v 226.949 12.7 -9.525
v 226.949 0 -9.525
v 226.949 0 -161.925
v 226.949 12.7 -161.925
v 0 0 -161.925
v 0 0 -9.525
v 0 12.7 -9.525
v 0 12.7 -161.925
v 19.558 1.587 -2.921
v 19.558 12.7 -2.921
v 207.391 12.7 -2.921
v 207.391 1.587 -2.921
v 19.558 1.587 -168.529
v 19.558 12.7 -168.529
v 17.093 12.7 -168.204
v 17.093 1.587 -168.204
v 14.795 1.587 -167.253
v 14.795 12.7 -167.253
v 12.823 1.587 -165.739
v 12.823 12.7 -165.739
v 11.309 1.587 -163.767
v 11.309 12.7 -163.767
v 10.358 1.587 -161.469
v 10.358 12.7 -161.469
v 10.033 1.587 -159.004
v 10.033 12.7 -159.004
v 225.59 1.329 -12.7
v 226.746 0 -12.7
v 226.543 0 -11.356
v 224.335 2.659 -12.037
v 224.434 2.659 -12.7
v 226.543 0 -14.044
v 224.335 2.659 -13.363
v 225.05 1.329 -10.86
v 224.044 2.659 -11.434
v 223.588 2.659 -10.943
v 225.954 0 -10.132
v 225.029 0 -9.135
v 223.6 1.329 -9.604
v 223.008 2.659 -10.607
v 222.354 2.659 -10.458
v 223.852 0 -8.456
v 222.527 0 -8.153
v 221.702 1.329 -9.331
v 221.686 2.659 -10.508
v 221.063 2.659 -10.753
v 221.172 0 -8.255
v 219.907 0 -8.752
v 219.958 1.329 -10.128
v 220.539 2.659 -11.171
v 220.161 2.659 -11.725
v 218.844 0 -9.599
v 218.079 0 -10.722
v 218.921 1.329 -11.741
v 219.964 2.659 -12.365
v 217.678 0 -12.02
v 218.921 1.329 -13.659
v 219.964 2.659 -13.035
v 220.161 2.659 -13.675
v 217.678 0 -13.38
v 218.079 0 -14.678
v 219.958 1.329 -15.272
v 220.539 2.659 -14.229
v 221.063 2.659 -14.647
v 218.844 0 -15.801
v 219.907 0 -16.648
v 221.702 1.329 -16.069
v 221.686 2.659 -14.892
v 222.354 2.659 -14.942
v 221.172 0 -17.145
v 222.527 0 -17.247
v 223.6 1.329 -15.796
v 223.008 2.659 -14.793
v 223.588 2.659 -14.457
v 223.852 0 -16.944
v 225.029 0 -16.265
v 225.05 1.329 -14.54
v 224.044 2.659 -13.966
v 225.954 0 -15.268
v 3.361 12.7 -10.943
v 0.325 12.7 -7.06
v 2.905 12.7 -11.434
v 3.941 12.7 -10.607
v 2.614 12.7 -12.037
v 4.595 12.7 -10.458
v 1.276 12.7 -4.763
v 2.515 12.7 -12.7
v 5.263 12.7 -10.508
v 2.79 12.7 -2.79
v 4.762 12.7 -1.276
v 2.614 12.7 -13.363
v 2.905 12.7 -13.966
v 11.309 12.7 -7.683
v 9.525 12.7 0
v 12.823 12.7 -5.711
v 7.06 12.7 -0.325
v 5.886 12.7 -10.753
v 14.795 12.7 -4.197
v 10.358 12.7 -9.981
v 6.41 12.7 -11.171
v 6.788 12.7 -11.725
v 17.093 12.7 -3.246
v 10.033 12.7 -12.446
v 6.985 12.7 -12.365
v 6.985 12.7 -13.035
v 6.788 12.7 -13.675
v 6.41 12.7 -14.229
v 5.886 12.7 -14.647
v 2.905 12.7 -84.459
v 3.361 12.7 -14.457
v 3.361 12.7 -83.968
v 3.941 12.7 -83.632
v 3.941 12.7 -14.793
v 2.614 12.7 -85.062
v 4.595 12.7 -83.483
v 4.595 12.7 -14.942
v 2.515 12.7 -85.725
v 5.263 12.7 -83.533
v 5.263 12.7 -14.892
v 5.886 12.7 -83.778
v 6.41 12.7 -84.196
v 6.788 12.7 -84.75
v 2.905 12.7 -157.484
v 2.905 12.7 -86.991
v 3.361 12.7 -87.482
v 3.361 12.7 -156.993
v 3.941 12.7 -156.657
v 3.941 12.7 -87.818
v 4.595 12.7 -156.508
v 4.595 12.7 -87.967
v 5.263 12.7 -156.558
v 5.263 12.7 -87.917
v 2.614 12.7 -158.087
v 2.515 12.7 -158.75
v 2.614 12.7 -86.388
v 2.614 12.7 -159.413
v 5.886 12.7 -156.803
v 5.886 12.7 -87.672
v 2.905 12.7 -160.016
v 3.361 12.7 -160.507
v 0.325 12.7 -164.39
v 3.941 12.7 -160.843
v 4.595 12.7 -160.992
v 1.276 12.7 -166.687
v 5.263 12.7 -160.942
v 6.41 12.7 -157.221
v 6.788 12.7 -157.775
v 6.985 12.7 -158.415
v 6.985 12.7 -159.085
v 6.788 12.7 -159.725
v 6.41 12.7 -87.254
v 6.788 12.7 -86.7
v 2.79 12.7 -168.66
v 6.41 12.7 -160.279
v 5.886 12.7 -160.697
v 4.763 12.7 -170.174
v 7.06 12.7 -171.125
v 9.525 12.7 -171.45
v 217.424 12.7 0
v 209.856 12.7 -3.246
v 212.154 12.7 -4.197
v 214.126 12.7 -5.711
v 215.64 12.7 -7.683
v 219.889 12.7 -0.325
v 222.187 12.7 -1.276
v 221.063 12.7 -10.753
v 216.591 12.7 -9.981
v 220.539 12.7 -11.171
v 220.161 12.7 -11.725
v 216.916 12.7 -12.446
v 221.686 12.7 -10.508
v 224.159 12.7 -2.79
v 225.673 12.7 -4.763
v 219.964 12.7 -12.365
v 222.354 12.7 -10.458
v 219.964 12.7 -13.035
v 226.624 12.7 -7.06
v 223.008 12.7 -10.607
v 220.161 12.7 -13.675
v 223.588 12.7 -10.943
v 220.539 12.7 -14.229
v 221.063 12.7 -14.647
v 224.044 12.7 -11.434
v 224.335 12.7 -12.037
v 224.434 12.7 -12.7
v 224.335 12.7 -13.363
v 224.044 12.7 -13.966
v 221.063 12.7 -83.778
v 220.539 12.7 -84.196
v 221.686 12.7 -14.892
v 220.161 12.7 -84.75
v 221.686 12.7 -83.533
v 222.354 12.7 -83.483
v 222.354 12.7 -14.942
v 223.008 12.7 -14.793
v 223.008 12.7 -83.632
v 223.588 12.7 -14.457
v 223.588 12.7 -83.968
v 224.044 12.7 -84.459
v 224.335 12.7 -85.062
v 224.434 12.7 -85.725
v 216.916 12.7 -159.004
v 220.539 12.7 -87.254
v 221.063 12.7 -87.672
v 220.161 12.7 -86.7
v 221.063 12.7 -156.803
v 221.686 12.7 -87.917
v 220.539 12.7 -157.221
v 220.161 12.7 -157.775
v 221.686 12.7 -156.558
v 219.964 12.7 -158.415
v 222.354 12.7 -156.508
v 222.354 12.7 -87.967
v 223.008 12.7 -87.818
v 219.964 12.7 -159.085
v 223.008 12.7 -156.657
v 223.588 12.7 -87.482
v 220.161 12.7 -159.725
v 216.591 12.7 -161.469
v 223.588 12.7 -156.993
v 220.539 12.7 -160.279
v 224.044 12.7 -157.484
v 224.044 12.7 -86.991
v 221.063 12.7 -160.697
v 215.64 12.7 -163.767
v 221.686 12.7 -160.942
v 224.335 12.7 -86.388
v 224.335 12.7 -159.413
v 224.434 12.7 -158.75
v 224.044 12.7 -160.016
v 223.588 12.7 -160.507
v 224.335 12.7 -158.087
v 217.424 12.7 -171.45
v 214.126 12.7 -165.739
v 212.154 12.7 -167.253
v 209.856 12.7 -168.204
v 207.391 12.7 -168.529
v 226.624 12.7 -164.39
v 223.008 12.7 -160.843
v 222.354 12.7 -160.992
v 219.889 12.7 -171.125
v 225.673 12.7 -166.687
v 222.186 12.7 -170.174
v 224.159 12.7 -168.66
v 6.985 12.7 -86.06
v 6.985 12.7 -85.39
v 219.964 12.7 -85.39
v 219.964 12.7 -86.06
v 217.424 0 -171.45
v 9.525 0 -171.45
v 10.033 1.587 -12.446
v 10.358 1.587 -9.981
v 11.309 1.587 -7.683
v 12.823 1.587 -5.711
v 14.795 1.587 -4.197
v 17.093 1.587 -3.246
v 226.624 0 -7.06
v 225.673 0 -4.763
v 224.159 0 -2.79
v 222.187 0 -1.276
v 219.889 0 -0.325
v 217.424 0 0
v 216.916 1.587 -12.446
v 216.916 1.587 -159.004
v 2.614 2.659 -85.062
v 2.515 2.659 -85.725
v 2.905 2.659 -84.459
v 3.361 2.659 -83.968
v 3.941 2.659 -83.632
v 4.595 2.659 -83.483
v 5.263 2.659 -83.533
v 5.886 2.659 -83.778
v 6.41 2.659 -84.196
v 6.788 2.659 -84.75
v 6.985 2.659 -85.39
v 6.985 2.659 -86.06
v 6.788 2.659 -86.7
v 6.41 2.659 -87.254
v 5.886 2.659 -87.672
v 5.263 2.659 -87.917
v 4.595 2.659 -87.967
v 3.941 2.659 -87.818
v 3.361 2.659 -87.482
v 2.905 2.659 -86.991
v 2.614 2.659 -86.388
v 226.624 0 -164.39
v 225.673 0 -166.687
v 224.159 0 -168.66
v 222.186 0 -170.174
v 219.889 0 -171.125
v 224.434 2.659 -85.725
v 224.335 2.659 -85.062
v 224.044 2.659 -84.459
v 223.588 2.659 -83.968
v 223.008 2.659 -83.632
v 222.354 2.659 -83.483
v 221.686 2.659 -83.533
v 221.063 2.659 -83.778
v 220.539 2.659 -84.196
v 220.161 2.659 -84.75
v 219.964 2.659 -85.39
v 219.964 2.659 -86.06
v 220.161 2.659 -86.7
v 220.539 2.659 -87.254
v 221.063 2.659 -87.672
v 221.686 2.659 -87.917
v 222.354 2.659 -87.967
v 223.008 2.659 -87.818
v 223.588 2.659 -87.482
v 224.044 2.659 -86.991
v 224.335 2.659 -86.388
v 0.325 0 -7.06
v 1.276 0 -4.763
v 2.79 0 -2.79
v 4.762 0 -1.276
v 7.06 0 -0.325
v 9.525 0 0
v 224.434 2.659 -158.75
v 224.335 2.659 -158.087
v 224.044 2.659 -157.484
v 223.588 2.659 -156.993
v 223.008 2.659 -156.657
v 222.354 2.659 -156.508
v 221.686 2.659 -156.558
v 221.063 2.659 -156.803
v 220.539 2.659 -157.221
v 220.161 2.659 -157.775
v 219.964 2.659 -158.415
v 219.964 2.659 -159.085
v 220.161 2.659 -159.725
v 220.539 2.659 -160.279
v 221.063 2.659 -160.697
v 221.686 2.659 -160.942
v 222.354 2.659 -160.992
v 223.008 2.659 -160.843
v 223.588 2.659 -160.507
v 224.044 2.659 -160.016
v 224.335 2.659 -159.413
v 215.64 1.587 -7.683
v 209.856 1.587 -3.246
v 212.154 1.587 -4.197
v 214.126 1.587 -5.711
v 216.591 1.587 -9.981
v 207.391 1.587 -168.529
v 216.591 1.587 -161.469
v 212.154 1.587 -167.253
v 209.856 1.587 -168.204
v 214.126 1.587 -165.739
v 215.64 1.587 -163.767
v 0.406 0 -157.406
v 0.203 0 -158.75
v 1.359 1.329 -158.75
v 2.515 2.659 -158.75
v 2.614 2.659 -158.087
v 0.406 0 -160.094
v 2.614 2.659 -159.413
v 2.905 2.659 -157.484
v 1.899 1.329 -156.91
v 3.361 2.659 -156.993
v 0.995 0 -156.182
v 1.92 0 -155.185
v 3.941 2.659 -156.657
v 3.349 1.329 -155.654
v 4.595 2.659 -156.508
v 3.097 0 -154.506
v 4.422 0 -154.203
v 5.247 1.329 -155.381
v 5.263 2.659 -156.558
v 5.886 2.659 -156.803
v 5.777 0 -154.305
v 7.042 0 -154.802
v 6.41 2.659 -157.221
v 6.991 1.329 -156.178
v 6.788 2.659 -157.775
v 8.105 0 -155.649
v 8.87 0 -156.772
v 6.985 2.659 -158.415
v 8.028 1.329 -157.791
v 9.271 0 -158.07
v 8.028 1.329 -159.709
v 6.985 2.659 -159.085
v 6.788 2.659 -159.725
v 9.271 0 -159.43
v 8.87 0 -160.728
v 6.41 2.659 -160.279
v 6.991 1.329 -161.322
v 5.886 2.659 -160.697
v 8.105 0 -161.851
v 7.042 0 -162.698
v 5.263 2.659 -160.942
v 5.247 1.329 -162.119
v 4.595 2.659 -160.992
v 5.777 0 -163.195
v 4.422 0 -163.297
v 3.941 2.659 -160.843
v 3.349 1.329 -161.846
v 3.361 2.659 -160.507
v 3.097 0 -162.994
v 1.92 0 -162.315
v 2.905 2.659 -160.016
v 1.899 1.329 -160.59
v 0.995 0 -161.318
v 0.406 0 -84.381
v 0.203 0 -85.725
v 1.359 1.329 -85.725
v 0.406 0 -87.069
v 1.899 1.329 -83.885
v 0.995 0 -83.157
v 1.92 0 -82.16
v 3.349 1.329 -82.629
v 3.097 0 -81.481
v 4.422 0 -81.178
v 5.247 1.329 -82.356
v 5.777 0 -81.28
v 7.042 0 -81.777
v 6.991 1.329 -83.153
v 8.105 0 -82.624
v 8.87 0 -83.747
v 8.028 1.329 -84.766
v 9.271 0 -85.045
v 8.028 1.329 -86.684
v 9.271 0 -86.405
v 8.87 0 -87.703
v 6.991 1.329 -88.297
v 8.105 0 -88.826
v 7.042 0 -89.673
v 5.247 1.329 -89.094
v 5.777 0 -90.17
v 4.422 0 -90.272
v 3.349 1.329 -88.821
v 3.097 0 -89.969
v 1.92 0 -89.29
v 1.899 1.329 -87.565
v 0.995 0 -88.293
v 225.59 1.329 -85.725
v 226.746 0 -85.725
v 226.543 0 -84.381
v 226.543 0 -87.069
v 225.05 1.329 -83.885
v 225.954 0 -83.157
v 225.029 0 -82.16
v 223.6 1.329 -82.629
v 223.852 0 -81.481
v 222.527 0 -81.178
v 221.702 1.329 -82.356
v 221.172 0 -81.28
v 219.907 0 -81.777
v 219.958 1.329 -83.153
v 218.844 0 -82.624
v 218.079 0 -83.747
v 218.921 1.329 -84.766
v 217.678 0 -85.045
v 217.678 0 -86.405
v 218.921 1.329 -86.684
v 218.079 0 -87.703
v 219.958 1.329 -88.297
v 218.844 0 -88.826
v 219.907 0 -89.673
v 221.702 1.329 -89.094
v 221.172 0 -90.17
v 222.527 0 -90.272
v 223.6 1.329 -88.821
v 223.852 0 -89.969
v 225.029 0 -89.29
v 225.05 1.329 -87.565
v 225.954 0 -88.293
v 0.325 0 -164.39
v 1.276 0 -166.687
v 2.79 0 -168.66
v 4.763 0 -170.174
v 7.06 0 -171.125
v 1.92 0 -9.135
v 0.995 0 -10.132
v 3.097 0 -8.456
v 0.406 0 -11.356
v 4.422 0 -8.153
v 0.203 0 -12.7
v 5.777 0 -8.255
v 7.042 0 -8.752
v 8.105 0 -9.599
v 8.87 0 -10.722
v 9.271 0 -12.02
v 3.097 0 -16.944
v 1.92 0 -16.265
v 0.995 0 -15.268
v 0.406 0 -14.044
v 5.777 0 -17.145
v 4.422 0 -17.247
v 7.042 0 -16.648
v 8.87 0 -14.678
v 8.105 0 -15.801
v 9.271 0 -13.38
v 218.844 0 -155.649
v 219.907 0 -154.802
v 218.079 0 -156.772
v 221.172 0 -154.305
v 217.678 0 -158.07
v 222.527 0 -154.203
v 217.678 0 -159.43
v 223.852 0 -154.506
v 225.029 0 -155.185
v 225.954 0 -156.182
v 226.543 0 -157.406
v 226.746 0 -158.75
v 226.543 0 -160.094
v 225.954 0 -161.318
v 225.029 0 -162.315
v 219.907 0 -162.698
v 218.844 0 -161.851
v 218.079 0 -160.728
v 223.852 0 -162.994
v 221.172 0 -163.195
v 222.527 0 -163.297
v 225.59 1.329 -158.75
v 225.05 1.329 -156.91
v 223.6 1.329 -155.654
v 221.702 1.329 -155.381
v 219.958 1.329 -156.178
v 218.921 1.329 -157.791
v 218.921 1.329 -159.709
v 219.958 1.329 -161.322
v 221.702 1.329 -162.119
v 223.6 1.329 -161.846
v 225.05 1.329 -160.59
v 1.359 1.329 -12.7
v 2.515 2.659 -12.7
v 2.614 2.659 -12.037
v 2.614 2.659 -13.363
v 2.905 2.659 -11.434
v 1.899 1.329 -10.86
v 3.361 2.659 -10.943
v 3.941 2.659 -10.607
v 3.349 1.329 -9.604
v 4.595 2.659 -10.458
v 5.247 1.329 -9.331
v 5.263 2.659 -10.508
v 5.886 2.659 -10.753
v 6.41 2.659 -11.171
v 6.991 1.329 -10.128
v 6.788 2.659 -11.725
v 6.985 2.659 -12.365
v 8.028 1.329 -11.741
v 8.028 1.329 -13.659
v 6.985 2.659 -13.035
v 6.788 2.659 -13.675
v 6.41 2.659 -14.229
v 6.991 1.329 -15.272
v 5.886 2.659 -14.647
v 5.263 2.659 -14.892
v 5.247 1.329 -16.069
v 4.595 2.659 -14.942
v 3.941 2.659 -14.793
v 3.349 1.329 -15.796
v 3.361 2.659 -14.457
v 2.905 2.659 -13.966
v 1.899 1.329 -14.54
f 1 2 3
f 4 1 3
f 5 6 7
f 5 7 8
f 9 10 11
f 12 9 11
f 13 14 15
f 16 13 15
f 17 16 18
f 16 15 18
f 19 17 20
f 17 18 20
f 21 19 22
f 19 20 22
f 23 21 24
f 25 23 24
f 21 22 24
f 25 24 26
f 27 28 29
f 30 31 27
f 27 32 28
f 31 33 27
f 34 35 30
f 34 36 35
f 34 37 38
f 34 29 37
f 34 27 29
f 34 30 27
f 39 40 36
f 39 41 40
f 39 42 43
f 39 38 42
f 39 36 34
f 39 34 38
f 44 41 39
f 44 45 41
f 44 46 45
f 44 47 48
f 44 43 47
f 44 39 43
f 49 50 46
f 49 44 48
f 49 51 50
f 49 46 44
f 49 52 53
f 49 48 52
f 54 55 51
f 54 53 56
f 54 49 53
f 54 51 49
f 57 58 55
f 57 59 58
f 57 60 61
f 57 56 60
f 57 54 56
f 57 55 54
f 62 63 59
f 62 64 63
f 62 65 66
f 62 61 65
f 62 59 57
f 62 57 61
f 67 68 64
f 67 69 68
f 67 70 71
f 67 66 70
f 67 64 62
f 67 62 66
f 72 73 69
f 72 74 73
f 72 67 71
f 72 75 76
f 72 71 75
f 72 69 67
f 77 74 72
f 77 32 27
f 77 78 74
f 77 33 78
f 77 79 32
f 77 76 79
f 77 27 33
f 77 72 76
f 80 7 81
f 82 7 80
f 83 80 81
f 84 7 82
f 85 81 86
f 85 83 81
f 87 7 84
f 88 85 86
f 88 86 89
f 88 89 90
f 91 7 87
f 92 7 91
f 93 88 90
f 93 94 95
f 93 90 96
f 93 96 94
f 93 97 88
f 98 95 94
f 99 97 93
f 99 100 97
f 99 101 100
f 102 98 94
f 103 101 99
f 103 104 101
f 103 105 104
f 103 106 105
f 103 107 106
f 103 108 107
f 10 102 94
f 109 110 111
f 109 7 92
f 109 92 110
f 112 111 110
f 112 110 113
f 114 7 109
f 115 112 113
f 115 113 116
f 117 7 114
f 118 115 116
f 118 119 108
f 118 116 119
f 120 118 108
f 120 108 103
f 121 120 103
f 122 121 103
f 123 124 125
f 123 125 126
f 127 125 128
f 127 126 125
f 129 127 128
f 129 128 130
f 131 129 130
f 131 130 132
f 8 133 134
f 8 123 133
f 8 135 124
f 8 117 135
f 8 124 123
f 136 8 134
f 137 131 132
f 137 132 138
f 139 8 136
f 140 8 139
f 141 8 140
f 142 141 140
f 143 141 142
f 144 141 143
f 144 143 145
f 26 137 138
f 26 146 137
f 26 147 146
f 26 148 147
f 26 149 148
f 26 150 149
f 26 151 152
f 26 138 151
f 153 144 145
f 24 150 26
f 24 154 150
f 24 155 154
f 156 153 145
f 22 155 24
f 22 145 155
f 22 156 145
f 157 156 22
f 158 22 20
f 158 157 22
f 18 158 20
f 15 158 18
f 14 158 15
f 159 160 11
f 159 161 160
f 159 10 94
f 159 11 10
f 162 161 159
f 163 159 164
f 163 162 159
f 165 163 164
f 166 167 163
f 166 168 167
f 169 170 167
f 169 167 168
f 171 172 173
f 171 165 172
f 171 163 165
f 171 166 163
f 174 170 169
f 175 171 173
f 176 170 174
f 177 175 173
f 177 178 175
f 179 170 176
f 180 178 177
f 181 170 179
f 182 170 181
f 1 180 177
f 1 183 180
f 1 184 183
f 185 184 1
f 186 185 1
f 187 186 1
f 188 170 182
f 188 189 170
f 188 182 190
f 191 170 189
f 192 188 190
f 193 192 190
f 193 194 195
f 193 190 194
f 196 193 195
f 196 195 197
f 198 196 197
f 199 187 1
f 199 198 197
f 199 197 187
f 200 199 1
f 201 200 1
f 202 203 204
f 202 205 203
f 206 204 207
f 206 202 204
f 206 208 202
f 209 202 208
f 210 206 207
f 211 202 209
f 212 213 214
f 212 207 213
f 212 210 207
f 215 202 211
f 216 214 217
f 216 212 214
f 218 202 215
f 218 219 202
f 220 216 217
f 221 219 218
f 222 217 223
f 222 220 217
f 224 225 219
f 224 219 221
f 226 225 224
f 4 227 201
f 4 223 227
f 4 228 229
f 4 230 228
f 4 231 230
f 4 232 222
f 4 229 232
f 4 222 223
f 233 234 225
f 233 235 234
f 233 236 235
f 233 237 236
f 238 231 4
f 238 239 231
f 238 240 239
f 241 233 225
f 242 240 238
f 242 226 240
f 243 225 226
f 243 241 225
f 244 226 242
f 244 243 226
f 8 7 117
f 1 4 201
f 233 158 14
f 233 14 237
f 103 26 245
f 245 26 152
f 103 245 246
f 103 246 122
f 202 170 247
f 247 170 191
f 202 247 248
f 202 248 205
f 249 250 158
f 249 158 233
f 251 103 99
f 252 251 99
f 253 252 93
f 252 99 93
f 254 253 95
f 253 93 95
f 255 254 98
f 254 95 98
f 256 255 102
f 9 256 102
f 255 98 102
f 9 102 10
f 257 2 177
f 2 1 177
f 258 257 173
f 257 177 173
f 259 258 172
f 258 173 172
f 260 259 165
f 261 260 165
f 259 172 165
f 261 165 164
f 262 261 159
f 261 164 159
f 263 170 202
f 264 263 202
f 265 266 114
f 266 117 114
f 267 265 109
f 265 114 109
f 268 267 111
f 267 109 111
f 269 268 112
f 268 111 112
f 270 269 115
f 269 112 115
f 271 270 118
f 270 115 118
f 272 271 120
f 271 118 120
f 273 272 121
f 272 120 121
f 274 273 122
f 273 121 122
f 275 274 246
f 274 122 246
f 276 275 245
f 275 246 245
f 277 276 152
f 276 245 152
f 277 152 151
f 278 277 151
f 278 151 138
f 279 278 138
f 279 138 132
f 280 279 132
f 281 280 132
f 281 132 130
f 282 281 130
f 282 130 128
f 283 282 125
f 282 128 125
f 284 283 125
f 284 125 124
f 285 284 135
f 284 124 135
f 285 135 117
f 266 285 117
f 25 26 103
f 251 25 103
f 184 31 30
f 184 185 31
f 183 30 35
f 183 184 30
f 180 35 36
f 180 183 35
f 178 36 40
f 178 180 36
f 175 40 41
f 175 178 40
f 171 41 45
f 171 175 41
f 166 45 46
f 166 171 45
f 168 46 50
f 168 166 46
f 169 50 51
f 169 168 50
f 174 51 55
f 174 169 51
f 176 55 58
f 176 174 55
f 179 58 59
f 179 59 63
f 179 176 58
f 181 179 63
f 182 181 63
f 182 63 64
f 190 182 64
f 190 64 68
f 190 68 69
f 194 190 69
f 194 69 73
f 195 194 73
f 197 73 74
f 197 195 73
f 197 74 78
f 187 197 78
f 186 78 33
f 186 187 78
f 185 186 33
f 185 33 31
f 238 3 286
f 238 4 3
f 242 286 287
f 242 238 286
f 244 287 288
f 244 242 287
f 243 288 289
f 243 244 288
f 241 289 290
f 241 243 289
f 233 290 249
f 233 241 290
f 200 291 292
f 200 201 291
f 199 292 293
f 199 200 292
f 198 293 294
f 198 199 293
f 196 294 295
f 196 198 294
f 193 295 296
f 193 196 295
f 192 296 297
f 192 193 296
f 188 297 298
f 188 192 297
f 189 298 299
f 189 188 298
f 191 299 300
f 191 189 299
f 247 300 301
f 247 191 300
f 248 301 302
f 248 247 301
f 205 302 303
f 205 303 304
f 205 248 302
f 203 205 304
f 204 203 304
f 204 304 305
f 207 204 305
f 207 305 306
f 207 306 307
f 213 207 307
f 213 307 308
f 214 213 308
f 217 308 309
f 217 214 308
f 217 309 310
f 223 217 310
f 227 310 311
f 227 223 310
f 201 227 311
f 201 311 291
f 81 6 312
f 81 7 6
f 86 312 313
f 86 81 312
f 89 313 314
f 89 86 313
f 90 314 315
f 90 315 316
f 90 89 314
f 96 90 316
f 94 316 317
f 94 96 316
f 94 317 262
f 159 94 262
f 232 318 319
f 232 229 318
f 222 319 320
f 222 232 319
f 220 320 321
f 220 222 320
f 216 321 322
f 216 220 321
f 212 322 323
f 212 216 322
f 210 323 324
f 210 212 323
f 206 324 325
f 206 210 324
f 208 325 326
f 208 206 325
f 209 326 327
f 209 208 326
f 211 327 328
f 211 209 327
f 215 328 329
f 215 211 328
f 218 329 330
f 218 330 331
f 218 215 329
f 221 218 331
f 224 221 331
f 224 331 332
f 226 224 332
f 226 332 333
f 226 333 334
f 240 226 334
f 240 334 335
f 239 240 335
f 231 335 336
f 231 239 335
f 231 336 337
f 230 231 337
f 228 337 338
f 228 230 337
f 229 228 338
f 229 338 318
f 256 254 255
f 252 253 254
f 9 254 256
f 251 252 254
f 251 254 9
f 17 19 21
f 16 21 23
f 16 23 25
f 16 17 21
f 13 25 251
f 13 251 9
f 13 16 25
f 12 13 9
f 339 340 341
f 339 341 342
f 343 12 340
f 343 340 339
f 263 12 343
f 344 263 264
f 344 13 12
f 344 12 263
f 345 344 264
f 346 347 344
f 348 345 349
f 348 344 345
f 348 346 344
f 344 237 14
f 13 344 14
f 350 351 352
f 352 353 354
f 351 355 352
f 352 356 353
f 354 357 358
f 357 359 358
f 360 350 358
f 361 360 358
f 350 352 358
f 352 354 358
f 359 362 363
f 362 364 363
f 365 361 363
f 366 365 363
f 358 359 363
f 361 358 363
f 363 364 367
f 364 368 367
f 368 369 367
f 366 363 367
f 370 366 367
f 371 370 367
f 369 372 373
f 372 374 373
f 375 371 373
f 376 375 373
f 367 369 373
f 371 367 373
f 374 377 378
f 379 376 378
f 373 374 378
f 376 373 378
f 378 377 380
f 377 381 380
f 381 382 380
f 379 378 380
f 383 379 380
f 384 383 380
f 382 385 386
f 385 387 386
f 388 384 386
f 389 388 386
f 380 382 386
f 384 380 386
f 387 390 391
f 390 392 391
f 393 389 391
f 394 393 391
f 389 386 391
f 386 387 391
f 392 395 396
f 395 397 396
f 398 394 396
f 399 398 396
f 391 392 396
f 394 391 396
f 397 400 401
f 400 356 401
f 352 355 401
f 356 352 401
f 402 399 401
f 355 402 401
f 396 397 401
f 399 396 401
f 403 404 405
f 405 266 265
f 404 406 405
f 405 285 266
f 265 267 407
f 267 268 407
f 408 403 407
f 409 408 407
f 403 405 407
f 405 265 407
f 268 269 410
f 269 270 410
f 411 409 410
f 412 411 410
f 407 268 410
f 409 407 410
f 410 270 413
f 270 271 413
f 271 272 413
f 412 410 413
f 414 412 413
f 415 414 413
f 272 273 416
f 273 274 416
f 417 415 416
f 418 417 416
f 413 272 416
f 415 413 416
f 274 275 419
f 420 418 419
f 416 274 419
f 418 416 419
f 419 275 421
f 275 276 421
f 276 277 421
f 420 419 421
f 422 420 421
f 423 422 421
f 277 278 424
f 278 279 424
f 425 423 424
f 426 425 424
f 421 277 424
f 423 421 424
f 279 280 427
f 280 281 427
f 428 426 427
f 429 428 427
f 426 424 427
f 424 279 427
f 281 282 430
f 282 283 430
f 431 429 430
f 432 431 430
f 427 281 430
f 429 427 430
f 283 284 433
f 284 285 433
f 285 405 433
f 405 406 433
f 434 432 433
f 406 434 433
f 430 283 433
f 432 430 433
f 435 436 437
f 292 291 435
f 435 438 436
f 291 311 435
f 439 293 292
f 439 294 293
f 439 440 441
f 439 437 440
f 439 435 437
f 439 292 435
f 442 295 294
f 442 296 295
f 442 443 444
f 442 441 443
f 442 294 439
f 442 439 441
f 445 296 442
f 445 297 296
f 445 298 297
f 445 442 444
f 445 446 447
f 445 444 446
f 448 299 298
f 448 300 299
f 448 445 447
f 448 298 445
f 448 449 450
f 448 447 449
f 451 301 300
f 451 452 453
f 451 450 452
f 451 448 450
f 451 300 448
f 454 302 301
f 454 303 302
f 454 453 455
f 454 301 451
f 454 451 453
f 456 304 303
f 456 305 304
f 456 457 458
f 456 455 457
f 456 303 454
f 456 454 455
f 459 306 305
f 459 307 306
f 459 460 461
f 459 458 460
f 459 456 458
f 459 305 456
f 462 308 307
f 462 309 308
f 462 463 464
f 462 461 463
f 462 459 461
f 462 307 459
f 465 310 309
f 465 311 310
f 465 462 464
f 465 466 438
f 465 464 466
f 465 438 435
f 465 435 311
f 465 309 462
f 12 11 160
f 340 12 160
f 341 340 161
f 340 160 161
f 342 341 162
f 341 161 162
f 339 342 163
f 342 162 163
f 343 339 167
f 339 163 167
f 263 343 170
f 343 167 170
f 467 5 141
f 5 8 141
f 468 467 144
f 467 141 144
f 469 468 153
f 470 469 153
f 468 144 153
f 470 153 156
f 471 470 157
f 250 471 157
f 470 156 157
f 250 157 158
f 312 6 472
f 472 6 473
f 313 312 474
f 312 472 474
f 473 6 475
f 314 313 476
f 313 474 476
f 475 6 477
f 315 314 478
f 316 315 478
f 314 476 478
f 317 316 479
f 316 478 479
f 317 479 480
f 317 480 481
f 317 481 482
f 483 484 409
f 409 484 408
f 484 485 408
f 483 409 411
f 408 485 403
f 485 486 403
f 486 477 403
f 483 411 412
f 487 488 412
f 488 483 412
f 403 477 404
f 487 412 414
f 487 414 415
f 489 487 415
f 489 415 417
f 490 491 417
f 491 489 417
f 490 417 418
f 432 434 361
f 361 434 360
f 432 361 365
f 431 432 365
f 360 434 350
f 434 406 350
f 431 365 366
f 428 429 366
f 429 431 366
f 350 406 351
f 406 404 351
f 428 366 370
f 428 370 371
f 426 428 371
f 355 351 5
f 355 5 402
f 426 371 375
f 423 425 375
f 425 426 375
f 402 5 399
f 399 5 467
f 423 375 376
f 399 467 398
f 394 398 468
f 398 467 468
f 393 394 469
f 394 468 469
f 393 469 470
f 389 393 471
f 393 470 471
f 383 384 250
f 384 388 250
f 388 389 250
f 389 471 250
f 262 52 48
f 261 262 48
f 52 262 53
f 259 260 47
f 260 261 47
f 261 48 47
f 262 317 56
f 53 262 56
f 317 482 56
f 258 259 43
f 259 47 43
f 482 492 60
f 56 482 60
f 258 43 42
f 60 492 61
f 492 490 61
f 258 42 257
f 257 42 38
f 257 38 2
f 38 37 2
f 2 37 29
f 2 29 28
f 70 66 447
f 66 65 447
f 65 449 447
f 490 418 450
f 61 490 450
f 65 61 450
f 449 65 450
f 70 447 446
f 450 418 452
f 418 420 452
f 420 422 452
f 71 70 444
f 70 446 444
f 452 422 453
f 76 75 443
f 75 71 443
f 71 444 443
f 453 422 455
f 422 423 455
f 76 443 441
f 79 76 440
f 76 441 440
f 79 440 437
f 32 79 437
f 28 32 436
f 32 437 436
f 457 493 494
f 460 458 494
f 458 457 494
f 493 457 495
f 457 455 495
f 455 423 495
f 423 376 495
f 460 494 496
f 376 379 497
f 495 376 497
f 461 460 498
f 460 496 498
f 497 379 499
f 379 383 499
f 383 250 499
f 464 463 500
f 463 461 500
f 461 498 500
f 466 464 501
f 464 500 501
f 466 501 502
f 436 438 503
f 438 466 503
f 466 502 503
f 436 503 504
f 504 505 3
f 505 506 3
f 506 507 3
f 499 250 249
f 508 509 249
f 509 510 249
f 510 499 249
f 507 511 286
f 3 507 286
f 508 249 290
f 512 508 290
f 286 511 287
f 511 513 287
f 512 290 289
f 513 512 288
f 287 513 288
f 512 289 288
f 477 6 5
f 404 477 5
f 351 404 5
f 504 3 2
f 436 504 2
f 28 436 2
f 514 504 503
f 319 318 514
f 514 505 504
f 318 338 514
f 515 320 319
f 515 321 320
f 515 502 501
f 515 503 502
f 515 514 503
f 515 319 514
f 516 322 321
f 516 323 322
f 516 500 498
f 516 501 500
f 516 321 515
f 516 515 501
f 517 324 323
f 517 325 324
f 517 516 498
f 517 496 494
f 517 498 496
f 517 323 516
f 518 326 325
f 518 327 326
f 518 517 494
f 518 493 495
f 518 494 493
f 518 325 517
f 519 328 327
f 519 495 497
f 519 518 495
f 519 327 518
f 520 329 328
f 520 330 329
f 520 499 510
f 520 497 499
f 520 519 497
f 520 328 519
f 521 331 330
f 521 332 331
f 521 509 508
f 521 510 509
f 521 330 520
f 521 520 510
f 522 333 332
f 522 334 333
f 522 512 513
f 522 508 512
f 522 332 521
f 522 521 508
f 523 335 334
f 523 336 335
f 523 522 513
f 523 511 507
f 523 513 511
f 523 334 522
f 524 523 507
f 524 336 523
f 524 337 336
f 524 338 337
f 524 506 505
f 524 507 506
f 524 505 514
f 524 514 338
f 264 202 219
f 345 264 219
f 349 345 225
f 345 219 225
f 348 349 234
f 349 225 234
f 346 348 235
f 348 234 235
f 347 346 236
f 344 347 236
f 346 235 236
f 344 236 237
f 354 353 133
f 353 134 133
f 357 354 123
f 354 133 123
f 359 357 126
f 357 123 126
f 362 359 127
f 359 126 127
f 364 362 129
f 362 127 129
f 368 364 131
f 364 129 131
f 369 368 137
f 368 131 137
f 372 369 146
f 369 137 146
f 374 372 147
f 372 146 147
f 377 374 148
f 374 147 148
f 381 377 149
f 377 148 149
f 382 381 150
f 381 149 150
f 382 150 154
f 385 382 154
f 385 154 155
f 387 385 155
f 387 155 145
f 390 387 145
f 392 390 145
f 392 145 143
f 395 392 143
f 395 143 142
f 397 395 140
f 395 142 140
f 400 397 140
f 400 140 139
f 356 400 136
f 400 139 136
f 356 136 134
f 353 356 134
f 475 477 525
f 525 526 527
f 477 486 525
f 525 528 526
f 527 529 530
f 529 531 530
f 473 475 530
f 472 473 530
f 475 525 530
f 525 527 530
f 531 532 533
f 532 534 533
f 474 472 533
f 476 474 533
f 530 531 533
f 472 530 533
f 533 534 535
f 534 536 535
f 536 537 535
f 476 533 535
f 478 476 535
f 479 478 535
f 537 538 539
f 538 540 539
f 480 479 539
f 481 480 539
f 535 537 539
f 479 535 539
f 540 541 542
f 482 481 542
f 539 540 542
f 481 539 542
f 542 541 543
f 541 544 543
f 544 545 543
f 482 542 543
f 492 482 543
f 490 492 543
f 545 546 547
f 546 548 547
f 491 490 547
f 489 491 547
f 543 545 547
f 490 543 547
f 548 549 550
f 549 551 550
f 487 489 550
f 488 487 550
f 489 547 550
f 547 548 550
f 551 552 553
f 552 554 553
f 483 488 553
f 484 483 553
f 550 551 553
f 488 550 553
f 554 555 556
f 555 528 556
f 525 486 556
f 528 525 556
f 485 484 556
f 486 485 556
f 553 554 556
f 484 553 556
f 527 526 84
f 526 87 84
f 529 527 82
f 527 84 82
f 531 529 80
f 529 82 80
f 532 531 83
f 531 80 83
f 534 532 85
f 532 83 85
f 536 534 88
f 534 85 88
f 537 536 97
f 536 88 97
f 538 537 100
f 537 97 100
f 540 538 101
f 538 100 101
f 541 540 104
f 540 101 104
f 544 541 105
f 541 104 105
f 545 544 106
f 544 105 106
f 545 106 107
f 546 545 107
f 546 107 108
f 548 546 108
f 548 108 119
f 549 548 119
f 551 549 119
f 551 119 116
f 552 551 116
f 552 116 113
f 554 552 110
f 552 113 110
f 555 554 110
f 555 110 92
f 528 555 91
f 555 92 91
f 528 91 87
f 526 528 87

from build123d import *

# Parameters (mm, degrees)
SKETCH1_W                                         = 226.949
SKETCH1_H                                         = 171.45
BOSS_EXTRUDE1_DEPTH                               = 12.7
CUT_EXTRUDE1_DEPTH                                = 11.1125
CSK_FOR_8_FLAT_HEAD_SOCKET_CAP_SCREW1_D           = 4.4958
CSK_FOR_8_FLAT_HEAD_SOCKET_CAP_SCREW1_CSINK_D     = 9.1186
CSK_FOR_8_FLAT_HEAD_SOCKET_CAP_SCREW1_CSINK_ANGLE = 82
FILLET1_R                                         = 9.525


with BuildPart() as part:
    # Sketch1 → Boss-Extrude1 (new body)
    with BuildSketch(Plane(origin=(0, 0, 0), x_dir=(1, 0, 0), z_dir=(0, 1, 0))):
        with Locations((113.4745, 85.725)):
            Rectangle(SKETCH1_W, SKETCH1_H)
    extrude(amount=BOSS_EXTRUDE1_DEPTH)

    # Sketch2 → Cut-Extrude1 (cut)
    with BuildSketch(Plane(origin=(0, 12.7, 0), x_dir=(1, 0, 0), z_dir=(0, 1, 0))):
        with BuildLine():
            Line((19.558, 2.921), (207.391, 2.921))
            ThreePointArc((207.391, 2.921), (214.126192091, 5.710807909), (216.916, 12.446))
            Line((216.916, 12.446), (216.916, 159.004))
            ThreePointArc((216.916, 159.004), (214.126192091, 165.739192091), (207.391, 168.529))
            Line((207.391, 168.529), (19.558, 168.529))
            ThreePointArc((19.558, 168.529), (12.822807909, 165.739192091), (10.033, 159.004))
            Line((10.033, 159.004), (10.033, 12.446))
            ThreePointArc((10.033, 12.446), (12.822807909, 5.710807909), (19.558, 2.921))
        make_face()
    extrude(amount=-CUT_EXTRUDE1_DEPTH, mode=Mode.SUBTRACT)

    # CSK for #8 Flat Head Socket Cap Screw1 (through all)
    with Locations(Plane.XZ):
        with Locations((4.7625, -12.7), (4.7625, -158.75), (4.7625, -85.725)):
            csk_for_8_flat_head_socket_cap_screw1 = CounterSinkHole(CSK_FOR_8_FLAT_HEAD_SOCKET_CAP_SCREW1_D / 2, CSK_FOR_8_FLAT_HEAD_SOCKET_CAP_SCREW1_CSINK_D / 2, counter_sink_angle=CSK_FOR_8_FLAT_HEAD_SOCKET_CAP_SCREW1_CSINK_ANGLE)

    # Mirror1: CSK for #8 Flat Head Socket Cap Screw1 across plane
    add(csk_for_8_flat_head_socket_cap_screw1.mirror(Plane(origin=(113.4745, 0, 0), x_dir=(0, 0, 1), z_dir=(1, 0, 0))), mode=Mode.SUBTRACT)

    # Fillet1
    fillet1_edges = [part.edges().sort_by_distance(p)[0] for p in [
        (0, 6.35, -171.45),
        (226.949, 6.35, -171.45),
        (226.949, 6.35, 0),
        (0, 6.35, 0),
    ]]
    fillet(fillet1_edges, radius=FILLET1_R)


solid = part.part
